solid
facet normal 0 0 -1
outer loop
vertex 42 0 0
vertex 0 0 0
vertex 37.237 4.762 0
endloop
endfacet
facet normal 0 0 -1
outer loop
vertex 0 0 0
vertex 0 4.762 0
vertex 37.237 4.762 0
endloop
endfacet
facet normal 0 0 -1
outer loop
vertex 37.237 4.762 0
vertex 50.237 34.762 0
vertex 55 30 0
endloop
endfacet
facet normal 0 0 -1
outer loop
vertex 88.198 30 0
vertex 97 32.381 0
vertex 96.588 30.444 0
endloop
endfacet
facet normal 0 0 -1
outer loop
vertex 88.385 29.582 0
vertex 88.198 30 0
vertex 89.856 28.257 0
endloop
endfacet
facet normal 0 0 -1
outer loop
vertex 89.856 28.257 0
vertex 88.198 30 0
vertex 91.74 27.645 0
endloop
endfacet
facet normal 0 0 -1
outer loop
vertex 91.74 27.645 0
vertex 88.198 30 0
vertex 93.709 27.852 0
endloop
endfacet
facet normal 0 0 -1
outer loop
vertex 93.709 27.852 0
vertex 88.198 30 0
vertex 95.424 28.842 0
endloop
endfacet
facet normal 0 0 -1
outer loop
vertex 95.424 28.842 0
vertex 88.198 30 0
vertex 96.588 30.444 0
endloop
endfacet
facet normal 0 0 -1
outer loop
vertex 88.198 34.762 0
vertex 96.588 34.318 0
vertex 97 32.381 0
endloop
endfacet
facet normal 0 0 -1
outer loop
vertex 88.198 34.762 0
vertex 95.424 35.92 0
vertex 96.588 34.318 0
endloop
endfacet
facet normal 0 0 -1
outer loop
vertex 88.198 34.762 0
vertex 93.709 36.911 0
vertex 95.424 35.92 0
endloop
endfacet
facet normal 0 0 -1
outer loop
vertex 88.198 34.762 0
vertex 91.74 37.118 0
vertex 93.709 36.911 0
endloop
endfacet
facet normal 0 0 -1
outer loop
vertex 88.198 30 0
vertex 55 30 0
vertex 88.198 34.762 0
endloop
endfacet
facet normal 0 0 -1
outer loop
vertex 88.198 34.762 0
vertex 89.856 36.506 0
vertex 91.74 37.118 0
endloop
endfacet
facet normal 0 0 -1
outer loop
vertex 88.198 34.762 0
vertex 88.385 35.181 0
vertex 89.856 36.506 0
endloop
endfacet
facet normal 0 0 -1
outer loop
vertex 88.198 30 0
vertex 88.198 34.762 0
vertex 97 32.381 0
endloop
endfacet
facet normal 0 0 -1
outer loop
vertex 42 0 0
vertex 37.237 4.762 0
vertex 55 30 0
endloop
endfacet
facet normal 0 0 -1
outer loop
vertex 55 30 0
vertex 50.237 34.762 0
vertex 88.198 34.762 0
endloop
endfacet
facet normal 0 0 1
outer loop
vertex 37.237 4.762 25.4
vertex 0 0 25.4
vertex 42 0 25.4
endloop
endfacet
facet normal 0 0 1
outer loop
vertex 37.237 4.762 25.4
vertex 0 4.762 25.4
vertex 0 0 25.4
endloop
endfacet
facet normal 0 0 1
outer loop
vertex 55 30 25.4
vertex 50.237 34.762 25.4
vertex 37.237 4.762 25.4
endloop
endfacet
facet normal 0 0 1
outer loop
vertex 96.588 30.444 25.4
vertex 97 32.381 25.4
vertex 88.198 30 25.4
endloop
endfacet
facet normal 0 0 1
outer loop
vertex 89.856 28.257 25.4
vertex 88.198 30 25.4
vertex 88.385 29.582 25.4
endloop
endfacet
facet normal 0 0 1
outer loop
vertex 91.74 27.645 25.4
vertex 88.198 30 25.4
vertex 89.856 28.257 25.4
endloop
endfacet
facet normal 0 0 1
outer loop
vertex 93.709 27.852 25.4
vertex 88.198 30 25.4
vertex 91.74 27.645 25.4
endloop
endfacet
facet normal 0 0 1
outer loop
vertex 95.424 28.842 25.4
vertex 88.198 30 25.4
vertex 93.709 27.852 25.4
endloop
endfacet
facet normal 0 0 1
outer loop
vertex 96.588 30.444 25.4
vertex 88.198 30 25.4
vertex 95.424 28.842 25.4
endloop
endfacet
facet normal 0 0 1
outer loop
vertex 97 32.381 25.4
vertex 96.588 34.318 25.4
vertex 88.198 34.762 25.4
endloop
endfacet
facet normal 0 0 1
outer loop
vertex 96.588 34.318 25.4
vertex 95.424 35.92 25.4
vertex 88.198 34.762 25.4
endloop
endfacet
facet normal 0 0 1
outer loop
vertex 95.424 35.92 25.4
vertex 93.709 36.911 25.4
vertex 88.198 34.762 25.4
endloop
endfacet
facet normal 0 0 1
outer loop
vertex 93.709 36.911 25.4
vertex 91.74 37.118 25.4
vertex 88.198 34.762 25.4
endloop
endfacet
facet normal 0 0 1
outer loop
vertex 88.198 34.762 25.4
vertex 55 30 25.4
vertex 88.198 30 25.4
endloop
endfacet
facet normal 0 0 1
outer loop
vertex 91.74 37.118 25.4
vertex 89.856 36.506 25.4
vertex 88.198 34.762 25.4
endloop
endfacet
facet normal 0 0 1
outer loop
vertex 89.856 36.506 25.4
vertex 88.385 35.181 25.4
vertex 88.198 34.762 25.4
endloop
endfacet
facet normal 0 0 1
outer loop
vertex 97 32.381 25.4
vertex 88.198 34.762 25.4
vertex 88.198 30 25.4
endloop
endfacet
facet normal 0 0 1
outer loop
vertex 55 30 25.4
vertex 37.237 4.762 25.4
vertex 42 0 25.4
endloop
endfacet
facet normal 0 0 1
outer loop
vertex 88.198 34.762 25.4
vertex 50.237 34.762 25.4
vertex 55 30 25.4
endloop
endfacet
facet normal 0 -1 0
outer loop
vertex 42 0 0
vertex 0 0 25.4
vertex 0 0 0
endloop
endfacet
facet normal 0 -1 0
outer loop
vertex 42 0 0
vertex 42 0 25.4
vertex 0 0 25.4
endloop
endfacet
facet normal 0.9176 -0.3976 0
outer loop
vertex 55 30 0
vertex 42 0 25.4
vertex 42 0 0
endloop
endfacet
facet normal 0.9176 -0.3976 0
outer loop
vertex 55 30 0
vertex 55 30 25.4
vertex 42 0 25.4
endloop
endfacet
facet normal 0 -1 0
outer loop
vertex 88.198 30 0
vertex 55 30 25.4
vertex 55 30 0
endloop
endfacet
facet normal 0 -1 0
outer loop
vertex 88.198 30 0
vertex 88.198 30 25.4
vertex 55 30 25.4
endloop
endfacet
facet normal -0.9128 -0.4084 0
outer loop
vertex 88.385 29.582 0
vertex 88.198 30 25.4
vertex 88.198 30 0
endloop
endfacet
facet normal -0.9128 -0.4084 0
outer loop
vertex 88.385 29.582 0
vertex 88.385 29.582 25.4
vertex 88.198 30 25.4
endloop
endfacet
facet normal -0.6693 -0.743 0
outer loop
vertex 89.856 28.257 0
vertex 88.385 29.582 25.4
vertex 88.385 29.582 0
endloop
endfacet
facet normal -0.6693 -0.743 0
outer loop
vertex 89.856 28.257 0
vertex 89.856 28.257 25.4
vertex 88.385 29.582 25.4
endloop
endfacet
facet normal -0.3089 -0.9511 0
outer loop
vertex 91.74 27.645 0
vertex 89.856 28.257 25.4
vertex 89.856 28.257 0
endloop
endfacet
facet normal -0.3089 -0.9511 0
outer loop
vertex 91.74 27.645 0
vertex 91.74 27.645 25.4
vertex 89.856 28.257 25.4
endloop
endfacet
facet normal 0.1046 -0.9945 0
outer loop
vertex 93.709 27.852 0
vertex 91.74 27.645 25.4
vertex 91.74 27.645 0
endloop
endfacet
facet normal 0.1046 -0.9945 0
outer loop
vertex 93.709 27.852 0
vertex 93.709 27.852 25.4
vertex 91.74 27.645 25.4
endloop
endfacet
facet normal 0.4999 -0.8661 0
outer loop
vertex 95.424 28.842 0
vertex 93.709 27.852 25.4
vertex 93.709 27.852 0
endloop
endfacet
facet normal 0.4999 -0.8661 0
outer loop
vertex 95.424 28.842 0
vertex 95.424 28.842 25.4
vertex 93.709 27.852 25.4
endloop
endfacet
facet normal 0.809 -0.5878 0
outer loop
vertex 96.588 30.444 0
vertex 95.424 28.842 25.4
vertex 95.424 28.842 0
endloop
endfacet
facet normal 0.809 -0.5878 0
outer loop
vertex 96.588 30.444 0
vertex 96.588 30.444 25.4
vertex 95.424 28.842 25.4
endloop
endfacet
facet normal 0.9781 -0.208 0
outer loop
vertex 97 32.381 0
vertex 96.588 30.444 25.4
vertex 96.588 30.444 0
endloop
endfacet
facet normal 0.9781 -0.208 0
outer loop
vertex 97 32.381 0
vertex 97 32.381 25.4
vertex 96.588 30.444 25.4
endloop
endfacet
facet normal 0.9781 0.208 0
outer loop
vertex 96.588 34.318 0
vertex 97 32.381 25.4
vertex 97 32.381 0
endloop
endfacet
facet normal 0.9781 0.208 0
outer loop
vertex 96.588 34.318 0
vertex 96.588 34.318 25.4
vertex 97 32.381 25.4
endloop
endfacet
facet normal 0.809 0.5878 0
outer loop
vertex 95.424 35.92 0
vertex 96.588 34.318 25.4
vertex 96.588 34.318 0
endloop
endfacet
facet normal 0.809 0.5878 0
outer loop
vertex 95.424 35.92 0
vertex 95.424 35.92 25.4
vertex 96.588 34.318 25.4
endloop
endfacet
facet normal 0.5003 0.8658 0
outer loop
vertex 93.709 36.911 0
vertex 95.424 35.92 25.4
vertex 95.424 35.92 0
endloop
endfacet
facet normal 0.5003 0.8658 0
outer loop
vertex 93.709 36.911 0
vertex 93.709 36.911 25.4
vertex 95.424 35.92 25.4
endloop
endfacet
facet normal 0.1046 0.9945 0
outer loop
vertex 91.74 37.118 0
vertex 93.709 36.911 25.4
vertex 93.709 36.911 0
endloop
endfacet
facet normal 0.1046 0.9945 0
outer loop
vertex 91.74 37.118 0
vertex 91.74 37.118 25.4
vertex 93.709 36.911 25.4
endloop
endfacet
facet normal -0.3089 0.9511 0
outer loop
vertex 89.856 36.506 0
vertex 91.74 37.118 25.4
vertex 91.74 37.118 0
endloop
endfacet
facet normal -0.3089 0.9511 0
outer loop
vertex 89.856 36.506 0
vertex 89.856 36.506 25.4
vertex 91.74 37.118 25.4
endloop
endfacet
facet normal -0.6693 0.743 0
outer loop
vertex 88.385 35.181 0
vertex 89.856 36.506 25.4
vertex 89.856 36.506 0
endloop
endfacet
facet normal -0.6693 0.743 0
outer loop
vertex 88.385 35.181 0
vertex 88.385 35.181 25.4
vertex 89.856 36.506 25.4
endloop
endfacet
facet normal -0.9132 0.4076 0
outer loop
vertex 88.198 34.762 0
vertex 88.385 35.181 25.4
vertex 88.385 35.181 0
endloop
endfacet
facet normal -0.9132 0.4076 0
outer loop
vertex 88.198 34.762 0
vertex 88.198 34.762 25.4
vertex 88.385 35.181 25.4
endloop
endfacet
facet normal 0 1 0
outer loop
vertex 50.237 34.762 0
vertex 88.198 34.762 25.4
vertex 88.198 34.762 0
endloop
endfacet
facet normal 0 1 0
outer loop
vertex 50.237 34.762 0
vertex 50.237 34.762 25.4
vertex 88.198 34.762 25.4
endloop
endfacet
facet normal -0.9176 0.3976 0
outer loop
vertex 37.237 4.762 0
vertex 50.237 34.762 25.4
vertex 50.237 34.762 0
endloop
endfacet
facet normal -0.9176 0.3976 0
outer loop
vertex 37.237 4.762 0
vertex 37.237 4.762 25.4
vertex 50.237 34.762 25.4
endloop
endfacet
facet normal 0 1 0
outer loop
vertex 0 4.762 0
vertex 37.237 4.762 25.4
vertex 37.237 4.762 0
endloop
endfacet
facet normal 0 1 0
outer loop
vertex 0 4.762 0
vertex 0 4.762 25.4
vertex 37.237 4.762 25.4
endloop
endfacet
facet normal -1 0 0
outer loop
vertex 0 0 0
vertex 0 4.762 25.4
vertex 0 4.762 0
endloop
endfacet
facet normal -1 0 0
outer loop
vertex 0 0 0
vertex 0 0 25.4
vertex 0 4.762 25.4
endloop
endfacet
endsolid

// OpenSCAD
base_length = 42;       // 1 11/16th inch, rounded down
thickness = 1.5875 * 3; // 1/16th inch * new
lift_height = 30;
handle_length = 42;
height = 25.4;
base_to_end = 55;
hdist = base_to_end - handle_length;

linear_extrude(height) union()
{
    square([ base_length, thickness ]);
    hull()
    {
        translate([ base_length - thickness, 0, 0 ]) square([ thickness, thickness ]);
        translate([ base_length + hdist - thickness, lift_height ]) square([ thickness, thickness ]);
    }
    translate([ base_length + hdist - thickness, lift_height ]) square([ handle_length, thickness ]);
    translate([ base_length + hdist + handle_length - thickness, lift_height + (thickness / 2) ]) circle(r = thickness);
}
